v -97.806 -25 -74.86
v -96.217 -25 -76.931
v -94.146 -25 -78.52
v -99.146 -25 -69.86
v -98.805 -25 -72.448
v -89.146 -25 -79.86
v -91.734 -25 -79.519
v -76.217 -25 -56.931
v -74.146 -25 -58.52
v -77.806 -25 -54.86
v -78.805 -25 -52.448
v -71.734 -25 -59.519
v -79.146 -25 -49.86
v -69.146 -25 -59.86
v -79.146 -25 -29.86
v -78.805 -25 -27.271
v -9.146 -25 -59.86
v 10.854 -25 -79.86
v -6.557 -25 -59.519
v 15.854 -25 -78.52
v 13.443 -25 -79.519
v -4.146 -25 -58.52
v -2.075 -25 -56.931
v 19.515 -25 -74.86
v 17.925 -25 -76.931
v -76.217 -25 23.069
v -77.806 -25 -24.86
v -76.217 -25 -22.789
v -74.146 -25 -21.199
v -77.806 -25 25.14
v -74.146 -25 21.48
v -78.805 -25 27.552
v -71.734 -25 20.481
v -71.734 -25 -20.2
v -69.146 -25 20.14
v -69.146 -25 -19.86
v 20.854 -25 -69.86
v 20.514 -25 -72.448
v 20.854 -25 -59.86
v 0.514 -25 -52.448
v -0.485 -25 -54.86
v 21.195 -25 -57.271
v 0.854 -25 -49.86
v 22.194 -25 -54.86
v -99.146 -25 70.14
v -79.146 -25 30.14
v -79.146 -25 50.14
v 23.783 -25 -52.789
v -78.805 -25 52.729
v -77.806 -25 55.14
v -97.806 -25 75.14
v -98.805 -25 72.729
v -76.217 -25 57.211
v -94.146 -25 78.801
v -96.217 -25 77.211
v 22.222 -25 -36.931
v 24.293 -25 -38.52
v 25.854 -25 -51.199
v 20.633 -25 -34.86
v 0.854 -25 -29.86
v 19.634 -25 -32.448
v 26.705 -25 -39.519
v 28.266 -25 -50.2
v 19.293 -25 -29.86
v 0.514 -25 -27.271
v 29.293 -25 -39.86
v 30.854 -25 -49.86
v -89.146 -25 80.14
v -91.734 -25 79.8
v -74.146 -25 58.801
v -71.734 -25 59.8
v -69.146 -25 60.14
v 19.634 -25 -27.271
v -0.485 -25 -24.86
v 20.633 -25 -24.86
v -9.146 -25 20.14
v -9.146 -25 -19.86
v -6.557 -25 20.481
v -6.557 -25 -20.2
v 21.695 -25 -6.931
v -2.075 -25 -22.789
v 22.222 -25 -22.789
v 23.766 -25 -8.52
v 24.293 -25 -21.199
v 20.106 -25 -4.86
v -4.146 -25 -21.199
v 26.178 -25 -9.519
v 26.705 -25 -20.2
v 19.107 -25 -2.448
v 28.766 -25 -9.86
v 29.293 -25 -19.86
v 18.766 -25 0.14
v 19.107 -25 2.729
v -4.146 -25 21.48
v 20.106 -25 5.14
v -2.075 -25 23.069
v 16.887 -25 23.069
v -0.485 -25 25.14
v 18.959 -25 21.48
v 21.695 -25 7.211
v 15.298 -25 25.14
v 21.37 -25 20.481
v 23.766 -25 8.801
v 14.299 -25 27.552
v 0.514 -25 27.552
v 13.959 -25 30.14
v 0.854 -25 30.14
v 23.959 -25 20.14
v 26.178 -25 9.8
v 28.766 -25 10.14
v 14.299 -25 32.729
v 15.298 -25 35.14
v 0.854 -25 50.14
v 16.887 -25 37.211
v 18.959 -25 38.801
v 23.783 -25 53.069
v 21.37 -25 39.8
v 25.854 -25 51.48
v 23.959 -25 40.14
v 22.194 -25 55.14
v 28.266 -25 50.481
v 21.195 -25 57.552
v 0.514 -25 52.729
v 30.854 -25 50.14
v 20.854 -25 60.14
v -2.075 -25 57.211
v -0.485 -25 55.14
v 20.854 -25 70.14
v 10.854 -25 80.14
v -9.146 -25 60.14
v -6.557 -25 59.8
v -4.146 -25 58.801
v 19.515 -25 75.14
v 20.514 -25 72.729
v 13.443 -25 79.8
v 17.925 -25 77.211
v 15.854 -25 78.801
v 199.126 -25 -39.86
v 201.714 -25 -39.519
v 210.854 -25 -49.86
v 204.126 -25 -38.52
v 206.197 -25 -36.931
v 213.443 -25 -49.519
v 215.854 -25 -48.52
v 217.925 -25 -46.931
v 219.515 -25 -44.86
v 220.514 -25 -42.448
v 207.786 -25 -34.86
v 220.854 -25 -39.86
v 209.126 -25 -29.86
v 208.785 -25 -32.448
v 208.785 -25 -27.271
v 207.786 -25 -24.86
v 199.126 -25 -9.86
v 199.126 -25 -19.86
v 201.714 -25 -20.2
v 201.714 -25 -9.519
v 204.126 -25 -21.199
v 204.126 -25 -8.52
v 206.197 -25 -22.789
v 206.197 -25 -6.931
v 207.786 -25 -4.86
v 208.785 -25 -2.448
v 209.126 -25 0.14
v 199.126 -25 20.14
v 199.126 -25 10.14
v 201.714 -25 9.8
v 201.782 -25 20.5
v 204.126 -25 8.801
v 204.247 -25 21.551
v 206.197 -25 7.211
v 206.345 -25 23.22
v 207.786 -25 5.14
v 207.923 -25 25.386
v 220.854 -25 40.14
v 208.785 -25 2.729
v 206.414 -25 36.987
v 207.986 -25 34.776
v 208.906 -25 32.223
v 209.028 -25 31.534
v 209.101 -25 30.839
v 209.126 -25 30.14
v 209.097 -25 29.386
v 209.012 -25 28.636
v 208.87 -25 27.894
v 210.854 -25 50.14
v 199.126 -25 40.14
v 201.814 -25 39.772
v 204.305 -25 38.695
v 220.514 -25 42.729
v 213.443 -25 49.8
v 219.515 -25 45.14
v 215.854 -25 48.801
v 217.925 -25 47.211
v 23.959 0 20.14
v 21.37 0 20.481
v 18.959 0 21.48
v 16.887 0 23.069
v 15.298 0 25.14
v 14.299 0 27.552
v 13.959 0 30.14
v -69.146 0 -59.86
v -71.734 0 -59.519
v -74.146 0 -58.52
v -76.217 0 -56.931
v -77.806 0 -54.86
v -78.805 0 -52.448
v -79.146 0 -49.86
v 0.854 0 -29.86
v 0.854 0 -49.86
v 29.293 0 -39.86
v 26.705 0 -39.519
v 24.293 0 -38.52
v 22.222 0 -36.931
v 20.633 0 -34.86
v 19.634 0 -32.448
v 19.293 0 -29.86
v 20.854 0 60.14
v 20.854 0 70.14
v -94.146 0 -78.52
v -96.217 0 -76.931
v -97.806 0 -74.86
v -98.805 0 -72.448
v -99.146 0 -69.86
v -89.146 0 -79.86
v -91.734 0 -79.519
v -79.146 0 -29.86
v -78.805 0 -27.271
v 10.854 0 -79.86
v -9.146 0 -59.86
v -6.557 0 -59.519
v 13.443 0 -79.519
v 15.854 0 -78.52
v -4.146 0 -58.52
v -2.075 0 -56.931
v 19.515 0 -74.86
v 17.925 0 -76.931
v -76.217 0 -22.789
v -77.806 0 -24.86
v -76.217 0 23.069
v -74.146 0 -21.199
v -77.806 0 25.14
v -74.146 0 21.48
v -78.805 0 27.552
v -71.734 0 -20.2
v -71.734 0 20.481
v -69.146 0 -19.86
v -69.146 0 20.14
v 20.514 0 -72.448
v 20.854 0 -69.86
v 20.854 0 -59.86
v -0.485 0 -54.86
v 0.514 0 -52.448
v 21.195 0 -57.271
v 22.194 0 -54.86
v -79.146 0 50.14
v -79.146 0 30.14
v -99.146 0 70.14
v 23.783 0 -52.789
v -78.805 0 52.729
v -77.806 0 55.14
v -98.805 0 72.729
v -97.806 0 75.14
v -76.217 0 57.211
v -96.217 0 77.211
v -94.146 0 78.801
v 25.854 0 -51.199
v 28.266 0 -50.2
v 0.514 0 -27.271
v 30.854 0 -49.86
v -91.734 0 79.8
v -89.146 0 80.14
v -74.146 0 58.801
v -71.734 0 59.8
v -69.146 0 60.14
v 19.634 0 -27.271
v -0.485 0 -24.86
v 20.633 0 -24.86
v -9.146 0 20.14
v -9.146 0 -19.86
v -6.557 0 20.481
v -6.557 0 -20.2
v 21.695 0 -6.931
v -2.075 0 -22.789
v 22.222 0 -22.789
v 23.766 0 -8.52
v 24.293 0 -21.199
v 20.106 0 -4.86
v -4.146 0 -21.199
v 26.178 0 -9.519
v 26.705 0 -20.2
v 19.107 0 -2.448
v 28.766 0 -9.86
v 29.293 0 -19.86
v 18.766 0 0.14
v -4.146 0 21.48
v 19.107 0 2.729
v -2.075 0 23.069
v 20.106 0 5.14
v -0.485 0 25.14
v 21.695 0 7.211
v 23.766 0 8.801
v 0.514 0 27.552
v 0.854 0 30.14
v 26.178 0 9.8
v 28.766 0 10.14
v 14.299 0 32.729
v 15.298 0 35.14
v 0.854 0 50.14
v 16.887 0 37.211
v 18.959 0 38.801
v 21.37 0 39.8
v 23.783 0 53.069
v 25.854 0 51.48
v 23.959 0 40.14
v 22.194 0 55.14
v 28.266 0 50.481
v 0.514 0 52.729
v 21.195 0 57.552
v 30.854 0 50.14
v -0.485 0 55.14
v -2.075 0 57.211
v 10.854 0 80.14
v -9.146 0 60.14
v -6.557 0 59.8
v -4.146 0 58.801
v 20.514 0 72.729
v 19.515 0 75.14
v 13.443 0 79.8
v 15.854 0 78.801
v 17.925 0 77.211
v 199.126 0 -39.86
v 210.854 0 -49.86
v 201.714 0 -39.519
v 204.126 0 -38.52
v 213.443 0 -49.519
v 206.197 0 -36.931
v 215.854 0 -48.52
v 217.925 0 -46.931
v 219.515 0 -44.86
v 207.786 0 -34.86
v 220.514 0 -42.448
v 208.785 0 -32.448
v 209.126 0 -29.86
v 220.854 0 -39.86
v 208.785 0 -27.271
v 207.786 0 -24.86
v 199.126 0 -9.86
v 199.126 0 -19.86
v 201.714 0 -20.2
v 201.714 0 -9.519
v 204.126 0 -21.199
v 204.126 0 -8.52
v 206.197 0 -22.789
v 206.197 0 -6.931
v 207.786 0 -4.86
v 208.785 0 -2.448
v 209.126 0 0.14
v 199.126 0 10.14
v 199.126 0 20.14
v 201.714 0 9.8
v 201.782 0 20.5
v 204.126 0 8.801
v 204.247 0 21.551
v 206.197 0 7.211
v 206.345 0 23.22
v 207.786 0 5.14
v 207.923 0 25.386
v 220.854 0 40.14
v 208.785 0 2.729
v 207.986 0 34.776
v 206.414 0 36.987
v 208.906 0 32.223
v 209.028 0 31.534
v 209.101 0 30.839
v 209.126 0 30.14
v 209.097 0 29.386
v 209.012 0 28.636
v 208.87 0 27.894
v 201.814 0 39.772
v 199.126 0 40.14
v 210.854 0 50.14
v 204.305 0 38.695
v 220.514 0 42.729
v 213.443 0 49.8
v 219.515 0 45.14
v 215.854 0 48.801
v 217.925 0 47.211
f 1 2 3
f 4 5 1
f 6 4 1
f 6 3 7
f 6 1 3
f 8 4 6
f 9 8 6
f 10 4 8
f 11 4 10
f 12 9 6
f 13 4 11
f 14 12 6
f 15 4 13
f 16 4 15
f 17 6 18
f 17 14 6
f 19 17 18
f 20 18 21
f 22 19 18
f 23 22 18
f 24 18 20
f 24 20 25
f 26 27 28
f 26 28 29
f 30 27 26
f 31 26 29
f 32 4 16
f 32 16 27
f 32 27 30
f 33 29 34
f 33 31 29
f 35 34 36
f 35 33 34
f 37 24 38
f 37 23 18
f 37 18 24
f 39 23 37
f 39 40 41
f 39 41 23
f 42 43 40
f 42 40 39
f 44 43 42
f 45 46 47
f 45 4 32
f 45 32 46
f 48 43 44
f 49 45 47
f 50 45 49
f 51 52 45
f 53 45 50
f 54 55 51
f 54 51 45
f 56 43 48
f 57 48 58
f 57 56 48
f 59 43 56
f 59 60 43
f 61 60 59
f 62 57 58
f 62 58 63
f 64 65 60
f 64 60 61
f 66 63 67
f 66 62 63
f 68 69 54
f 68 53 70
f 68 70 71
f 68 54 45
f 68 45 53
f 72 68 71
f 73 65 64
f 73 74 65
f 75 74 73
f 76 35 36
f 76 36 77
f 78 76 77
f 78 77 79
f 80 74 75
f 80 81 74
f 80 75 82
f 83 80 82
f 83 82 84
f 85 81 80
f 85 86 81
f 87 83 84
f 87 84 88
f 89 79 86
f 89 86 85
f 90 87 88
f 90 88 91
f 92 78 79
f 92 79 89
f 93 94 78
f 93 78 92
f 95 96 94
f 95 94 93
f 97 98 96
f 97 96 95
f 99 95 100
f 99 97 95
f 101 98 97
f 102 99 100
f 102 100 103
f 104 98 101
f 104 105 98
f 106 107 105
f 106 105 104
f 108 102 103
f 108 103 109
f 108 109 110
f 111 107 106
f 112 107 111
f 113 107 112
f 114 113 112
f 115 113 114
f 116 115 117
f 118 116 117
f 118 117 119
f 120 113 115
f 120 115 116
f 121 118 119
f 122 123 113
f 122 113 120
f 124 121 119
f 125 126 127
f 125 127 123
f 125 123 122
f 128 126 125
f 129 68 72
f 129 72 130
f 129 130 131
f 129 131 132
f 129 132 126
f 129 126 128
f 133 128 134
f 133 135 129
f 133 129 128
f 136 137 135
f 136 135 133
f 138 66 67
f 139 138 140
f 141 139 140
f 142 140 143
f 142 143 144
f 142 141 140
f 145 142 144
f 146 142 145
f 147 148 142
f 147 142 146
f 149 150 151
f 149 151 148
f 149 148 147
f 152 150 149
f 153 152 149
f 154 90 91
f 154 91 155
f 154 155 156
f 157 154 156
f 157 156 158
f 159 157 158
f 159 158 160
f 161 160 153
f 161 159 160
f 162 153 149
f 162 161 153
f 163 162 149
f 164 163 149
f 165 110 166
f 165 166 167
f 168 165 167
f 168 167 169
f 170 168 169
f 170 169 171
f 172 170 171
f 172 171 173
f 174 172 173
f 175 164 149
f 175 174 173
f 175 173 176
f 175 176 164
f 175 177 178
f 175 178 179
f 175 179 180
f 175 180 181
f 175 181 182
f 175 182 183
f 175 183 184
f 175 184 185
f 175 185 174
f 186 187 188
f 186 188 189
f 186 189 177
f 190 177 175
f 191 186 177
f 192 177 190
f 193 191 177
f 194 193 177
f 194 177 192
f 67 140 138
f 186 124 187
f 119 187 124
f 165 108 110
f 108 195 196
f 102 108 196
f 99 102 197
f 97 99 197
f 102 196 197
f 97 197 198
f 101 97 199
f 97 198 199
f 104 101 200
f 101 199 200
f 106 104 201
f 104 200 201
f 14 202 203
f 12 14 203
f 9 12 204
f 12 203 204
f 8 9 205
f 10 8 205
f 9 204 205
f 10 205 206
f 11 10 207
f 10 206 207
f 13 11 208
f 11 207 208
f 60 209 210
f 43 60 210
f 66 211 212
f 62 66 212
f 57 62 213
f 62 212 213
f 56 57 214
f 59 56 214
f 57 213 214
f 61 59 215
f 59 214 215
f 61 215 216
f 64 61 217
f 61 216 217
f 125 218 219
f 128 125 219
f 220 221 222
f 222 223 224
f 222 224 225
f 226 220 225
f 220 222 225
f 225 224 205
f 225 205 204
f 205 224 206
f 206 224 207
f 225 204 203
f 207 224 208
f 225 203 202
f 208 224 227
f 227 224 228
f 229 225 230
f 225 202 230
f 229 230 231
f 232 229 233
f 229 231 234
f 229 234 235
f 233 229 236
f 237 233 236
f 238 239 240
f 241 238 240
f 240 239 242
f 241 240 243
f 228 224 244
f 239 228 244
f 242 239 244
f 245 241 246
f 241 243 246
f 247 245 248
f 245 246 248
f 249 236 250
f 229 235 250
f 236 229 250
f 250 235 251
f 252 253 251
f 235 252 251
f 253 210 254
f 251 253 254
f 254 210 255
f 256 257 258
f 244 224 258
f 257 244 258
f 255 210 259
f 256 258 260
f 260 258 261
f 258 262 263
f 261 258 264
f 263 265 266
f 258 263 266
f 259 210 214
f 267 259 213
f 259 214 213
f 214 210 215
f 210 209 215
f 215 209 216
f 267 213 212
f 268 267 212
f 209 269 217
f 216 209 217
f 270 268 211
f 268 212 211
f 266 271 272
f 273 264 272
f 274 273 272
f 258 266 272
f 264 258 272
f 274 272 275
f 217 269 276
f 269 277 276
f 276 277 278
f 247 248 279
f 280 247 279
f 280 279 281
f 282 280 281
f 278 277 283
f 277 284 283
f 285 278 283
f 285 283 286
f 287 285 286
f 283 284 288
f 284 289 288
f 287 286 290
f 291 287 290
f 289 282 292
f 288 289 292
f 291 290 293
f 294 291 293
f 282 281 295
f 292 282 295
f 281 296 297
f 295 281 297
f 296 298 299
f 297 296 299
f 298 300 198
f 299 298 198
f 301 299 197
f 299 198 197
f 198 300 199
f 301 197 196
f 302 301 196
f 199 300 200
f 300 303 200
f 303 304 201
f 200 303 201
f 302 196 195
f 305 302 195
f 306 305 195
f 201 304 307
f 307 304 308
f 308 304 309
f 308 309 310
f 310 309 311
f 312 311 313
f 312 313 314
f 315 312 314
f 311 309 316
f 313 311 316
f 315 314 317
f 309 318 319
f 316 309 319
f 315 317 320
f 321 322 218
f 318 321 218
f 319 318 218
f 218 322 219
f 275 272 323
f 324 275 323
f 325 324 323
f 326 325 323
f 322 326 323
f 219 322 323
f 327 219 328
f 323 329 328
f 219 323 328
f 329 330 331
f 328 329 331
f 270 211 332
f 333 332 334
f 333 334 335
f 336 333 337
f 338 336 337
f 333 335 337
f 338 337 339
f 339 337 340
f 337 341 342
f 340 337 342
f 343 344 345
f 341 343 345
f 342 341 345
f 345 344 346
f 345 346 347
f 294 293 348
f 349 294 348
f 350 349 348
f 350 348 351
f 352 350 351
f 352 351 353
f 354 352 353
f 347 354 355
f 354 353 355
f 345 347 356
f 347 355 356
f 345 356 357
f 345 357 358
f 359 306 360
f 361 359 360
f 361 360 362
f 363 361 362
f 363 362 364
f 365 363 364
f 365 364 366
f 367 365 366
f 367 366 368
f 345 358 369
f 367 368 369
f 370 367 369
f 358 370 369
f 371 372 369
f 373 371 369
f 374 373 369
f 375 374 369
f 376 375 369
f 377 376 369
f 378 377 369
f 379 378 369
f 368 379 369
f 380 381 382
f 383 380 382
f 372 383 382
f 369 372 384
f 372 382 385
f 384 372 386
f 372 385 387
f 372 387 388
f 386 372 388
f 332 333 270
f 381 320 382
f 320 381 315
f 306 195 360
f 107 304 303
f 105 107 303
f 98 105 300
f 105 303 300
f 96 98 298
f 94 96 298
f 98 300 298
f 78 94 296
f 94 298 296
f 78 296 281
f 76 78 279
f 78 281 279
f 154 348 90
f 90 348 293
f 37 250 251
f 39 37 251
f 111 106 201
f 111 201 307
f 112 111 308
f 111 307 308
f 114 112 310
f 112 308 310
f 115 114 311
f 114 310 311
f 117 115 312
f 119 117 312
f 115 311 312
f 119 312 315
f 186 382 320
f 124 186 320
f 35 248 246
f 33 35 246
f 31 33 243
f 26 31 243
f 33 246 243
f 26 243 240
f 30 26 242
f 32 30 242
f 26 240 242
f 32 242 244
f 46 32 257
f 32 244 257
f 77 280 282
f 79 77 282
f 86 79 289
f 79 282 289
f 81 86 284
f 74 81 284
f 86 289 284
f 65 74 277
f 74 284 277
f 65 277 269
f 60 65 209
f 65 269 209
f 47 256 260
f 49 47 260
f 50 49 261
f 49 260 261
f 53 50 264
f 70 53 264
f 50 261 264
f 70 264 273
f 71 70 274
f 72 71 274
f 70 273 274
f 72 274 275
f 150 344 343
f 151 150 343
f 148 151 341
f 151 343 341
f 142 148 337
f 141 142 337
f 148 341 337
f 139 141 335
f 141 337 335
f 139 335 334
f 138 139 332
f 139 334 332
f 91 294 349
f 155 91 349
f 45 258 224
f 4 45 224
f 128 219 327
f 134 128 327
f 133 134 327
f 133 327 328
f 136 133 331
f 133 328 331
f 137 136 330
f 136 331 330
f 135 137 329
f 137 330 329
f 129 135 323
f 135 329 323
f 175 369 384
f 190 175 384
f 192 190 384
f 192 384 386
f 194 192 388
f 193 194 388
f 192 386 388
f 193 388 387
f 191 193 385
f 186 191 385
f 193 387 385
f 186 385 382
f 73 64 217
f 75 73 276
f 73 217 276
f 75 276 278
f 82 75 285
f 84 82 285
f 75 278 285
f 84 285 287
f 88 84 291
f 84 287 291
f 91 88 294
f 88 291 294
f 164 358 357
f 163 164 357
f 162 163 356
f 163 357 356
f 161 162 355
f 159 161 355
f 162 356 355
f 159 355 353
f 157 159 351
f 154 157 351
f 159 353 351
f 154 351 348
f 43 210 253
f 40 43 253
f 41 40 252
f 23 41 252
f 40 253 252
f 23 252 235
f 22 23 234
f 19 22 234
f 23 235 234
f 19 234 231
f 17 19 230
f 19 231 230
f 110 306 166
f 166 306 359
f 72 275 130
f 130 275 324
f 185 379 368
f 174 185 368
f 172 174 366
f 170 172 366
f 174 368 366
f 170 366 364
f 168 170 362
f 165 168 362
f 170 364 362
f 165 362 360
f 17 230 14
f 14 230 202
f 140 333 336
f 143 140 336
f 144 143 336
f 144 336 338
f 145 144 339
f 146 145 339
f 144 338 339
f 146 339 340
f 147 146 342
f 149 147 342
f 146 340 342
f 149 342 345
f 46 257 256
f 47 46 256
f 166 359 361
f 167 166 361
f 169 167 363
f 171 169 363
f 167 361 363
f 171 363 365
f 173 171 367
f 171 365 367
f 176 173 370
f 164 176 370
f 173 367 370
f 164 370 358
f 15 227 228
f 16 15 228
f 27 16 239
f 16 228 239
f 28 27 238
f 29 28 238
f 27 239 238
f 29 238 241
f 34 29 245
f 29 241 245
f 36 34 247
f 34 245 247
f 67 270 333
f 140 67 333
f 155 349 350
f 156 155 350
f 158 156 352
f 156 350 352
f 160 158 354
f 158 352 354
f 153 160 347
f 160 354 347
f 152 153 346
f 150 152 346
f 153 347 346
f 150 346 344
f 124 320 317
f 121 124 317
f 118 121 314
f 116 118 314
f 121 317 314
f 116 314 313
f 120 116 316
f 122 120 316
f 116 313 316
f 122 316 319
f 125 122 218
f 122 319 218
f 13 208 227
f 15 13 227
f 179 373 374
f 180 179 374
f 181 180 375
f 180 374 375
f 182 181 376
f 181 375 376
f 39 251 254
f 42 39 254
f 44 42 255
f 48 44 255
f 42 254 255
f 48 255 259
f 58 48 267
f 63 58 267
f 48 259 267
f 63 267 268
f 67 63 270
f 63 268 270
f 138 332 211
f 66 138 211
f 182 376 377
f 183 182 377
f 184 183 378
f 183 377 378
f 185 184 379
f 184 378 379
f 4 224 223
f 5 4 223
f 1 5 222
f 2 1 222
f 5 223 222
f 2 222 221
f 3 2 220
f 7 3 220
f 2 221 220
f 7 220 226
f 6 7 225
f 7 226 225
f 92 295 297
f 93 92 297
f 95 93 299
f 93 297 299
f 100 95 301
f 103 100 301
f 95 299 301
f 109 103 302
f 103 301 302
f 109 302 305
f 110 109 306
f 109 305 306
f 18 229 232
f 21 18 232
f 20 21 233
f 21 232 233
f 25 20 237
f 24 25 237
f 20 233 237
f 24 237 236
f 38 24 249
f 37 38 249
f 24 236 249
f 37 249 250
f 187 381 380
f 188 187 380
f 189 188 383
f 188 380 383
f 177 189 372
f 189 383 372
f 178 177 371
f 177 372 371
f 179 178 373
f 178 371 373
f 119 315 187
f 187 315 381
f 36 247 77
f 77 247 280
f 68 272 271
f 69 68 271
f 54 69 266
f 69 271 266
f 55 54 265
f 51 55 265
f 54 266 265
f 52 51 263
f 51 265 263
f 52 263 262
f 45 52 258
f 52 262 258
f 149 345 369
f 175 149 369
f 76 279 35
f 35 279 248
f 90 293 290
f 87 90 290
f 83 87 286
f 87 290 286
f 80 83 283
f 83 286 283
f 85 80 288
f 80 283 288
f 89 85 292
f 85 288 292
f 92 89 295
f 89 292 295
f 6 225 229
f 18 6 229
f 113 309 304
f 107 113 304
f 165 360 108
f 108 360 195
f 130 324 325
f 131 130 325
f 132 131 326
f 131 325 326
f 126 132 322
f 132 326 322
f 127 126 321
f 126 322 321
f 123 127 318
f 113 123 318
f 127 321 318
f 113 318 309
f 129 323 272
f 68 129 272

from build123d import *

# Parameters (mm, degrees)
F1_DEPTH = 25


with BuildPart() as f1:
    # F0 (on Front) → F1 (new body)
    with BuildSketch(Plane.XZ):
        with BuildLine():
            ThreePointArc((-89.145688, 80.140374), (-96.216756, 77.211442), (-99.145688, 70.140374))
            Line((-99.145688, 70.140374), (-99.145688, -69.859626))
            ThreePointArc((-99.145688, -69.859626), (-96.216756, -76.930694), (-89.145688, -79.859626))
            Line((-89.145688, -79.859626), (10.854312, -79.859626))
            ThreePointArc((10.854312, -79.859626), (17.92538, -76.930694), (20.854312, -69.859626))
            Line((20.854312, -69.859626), (20.854312, -59.859626))
            ThreePointArc((20.854312, -59.859626), (23.783244, -52.788558), (30.854312, -49.859626))
            Line((30.854312, -49.859626), (210.854312, -49.859626))
            ThreePointArc((210.854312, -49.859626), (217.92538, -46.930694), (220.854312, -39.859626))
            Line((220.854312, -39.859626), (220.854312, 40.140374))
            ThreePointArc((220.854312, 40.140374), (217.92538, 47.211442), (210.854312, 50.140374))
            Line((210.854312, 50.140374), (30.854312, 50.140374))
            ThreePointArc((30.854312, 50.140374), (23.783244, 53.069306), (20.854312, 60.140374))
            Line((20.854312, 60.140374), (20.854312, 70.140374))
            ThreePointArc((20.854312, 70.140374), (17.92538, 77.211442), (10.854312, 80.140374))
            Line((10.854312, 80.140374), (-89.145688, 80.140374))
        make_face()
        with BuildLine():
            ThreePointArc((-79.145688, -29.859626), (-76.216756, -22.788558), (-69.145688, -19.859626))
            Line((-69.145688, -19.859626), (-9.145688, -19.859626))
            ThreePointArc((-9.145688, -19.859626), (-2.07462, -22.788558), (0.854312, -29.859626))
            Line((0.854312, -29.859626), (0.854312, -49.859626))
            ThreePointArc((0.854312, -49.859626), (-2.07462, -56.930694), (-9.145688, -59.859626))
            Line((-9.145688, -59.859626), (-69.145688, -59.859626))
            ThreePointArc((-69.145688, -59.859626), (-76.216756, -56.930694), (-79.145688, -49.859626))
            Line((-79.145688, -49.859626), (-79.145688, -29.859626))
        make_face(mode=Mode.SUBTRACT)
        with BuildLine():
            ThreePointArc((19.293068, -29.859626), (22.222, -22.788558), (29.293068, -19.859626))
            Line((29.293068, -19.859626), (199.125637, -19.859626))
            ThreePointArc((199.125637, -19.859626), (206.196705, -22.788558), (209.125637, -29.859626))
            ThreePointArc((209.125637, -29.859626), (206.196705, -36.930694), (199.125637, -39.859626))
            Line((199.125637, -39.859626), (29.293068, -39.859626))
            ThreePointArc((29.293068, -39.859626), (22.222, -36.930694), (19.293068, -29.859626))
        make_face(mode=Mode.SUBTRACT)
        with BuildLine():
            ThreePointArc((-79.145688, 50.140374), (-76.216756, 57.211442), (-69.145688, 60.140374))
            Line((-69.145688, 60.140374), (-9.145688, 60.140374))
            ThreePointArc((-9.145688, 60.140374), (-2.07462, 57.211442), (0.854312, 50.140374))
            Line((0.854312, 50.140374), (0.854312, 30.140374))
            ThreePointArc((0.854312, 30.140374), (-2.07462, 23.069306), (-9.145688, 20.140374))
            Line((-9.145688, 20.140374), (-69.145688, 20.140374))
            ThreePointArc((-69.145688, 20.140374), (-76.216756, 23.069306), (-79.145688, 30.140374))
            Line((-79.145688, 30.140374), (-79.145688, 50.140374))
        make_face(mode=Mode.SUBTRACT)
        with BuildLine():
            ThreePointArc((18.76592, 0.140374), (21.694852, 7.211442), (28.76592, 10.140374))
            Line((28.76592, 10.140374), (199.125638, 10.140374))
            ThreePointArc((199.125638, 10.140374), (206.196706, 7.211442), (209.125638, 0.140373))
            ThreePointArc((209.125638, 0.140373), (206.196706, -6.930694), (199.125638, -9.859626))
            Line((199.125638, -9.859626), (28.76592, -9.859626))
            ThreePointArc((28.76592, -9.859626), (21.694852, -6.930694), (18.76592, 0.140374))
        make_face(mode=Mode.SUBTRACT)
        with BuildLine():
            Line((23.958503, 40.140374), (199.125637, 40.140374))
            ThreePointArc((199.125637, 40.140374), (205.417556, 37.912874), (208.906425, 32.222725))
            ThreePointArc((208.906425, 32.222725), (209.070683, 31.187303), (209.125637, 30.140374))
            ThreePointArc((209.125637, 30.140374), (209.061539, 29.00995), (208.870066, 27.894018))
            ThreePointArc((208.870066, 27.894018), (205.352051, 22.3153), (199.125637, 20.140374))
            Line((199.125637, 20.140374), (23.958503, 20.140374))
            ThreePointArc((23.958503, 20.140374), (16.887436, 23.069306), (13.958503, 30.140374))
            ThreePointArc((13.958503, 30.140374), (16.887436, 37.211442), (23.958503, 40.140374))
        make_face(mode=Mode.SUBTRACT)
    extrude(amount=F1_DEPTH)


solid = f1.part
